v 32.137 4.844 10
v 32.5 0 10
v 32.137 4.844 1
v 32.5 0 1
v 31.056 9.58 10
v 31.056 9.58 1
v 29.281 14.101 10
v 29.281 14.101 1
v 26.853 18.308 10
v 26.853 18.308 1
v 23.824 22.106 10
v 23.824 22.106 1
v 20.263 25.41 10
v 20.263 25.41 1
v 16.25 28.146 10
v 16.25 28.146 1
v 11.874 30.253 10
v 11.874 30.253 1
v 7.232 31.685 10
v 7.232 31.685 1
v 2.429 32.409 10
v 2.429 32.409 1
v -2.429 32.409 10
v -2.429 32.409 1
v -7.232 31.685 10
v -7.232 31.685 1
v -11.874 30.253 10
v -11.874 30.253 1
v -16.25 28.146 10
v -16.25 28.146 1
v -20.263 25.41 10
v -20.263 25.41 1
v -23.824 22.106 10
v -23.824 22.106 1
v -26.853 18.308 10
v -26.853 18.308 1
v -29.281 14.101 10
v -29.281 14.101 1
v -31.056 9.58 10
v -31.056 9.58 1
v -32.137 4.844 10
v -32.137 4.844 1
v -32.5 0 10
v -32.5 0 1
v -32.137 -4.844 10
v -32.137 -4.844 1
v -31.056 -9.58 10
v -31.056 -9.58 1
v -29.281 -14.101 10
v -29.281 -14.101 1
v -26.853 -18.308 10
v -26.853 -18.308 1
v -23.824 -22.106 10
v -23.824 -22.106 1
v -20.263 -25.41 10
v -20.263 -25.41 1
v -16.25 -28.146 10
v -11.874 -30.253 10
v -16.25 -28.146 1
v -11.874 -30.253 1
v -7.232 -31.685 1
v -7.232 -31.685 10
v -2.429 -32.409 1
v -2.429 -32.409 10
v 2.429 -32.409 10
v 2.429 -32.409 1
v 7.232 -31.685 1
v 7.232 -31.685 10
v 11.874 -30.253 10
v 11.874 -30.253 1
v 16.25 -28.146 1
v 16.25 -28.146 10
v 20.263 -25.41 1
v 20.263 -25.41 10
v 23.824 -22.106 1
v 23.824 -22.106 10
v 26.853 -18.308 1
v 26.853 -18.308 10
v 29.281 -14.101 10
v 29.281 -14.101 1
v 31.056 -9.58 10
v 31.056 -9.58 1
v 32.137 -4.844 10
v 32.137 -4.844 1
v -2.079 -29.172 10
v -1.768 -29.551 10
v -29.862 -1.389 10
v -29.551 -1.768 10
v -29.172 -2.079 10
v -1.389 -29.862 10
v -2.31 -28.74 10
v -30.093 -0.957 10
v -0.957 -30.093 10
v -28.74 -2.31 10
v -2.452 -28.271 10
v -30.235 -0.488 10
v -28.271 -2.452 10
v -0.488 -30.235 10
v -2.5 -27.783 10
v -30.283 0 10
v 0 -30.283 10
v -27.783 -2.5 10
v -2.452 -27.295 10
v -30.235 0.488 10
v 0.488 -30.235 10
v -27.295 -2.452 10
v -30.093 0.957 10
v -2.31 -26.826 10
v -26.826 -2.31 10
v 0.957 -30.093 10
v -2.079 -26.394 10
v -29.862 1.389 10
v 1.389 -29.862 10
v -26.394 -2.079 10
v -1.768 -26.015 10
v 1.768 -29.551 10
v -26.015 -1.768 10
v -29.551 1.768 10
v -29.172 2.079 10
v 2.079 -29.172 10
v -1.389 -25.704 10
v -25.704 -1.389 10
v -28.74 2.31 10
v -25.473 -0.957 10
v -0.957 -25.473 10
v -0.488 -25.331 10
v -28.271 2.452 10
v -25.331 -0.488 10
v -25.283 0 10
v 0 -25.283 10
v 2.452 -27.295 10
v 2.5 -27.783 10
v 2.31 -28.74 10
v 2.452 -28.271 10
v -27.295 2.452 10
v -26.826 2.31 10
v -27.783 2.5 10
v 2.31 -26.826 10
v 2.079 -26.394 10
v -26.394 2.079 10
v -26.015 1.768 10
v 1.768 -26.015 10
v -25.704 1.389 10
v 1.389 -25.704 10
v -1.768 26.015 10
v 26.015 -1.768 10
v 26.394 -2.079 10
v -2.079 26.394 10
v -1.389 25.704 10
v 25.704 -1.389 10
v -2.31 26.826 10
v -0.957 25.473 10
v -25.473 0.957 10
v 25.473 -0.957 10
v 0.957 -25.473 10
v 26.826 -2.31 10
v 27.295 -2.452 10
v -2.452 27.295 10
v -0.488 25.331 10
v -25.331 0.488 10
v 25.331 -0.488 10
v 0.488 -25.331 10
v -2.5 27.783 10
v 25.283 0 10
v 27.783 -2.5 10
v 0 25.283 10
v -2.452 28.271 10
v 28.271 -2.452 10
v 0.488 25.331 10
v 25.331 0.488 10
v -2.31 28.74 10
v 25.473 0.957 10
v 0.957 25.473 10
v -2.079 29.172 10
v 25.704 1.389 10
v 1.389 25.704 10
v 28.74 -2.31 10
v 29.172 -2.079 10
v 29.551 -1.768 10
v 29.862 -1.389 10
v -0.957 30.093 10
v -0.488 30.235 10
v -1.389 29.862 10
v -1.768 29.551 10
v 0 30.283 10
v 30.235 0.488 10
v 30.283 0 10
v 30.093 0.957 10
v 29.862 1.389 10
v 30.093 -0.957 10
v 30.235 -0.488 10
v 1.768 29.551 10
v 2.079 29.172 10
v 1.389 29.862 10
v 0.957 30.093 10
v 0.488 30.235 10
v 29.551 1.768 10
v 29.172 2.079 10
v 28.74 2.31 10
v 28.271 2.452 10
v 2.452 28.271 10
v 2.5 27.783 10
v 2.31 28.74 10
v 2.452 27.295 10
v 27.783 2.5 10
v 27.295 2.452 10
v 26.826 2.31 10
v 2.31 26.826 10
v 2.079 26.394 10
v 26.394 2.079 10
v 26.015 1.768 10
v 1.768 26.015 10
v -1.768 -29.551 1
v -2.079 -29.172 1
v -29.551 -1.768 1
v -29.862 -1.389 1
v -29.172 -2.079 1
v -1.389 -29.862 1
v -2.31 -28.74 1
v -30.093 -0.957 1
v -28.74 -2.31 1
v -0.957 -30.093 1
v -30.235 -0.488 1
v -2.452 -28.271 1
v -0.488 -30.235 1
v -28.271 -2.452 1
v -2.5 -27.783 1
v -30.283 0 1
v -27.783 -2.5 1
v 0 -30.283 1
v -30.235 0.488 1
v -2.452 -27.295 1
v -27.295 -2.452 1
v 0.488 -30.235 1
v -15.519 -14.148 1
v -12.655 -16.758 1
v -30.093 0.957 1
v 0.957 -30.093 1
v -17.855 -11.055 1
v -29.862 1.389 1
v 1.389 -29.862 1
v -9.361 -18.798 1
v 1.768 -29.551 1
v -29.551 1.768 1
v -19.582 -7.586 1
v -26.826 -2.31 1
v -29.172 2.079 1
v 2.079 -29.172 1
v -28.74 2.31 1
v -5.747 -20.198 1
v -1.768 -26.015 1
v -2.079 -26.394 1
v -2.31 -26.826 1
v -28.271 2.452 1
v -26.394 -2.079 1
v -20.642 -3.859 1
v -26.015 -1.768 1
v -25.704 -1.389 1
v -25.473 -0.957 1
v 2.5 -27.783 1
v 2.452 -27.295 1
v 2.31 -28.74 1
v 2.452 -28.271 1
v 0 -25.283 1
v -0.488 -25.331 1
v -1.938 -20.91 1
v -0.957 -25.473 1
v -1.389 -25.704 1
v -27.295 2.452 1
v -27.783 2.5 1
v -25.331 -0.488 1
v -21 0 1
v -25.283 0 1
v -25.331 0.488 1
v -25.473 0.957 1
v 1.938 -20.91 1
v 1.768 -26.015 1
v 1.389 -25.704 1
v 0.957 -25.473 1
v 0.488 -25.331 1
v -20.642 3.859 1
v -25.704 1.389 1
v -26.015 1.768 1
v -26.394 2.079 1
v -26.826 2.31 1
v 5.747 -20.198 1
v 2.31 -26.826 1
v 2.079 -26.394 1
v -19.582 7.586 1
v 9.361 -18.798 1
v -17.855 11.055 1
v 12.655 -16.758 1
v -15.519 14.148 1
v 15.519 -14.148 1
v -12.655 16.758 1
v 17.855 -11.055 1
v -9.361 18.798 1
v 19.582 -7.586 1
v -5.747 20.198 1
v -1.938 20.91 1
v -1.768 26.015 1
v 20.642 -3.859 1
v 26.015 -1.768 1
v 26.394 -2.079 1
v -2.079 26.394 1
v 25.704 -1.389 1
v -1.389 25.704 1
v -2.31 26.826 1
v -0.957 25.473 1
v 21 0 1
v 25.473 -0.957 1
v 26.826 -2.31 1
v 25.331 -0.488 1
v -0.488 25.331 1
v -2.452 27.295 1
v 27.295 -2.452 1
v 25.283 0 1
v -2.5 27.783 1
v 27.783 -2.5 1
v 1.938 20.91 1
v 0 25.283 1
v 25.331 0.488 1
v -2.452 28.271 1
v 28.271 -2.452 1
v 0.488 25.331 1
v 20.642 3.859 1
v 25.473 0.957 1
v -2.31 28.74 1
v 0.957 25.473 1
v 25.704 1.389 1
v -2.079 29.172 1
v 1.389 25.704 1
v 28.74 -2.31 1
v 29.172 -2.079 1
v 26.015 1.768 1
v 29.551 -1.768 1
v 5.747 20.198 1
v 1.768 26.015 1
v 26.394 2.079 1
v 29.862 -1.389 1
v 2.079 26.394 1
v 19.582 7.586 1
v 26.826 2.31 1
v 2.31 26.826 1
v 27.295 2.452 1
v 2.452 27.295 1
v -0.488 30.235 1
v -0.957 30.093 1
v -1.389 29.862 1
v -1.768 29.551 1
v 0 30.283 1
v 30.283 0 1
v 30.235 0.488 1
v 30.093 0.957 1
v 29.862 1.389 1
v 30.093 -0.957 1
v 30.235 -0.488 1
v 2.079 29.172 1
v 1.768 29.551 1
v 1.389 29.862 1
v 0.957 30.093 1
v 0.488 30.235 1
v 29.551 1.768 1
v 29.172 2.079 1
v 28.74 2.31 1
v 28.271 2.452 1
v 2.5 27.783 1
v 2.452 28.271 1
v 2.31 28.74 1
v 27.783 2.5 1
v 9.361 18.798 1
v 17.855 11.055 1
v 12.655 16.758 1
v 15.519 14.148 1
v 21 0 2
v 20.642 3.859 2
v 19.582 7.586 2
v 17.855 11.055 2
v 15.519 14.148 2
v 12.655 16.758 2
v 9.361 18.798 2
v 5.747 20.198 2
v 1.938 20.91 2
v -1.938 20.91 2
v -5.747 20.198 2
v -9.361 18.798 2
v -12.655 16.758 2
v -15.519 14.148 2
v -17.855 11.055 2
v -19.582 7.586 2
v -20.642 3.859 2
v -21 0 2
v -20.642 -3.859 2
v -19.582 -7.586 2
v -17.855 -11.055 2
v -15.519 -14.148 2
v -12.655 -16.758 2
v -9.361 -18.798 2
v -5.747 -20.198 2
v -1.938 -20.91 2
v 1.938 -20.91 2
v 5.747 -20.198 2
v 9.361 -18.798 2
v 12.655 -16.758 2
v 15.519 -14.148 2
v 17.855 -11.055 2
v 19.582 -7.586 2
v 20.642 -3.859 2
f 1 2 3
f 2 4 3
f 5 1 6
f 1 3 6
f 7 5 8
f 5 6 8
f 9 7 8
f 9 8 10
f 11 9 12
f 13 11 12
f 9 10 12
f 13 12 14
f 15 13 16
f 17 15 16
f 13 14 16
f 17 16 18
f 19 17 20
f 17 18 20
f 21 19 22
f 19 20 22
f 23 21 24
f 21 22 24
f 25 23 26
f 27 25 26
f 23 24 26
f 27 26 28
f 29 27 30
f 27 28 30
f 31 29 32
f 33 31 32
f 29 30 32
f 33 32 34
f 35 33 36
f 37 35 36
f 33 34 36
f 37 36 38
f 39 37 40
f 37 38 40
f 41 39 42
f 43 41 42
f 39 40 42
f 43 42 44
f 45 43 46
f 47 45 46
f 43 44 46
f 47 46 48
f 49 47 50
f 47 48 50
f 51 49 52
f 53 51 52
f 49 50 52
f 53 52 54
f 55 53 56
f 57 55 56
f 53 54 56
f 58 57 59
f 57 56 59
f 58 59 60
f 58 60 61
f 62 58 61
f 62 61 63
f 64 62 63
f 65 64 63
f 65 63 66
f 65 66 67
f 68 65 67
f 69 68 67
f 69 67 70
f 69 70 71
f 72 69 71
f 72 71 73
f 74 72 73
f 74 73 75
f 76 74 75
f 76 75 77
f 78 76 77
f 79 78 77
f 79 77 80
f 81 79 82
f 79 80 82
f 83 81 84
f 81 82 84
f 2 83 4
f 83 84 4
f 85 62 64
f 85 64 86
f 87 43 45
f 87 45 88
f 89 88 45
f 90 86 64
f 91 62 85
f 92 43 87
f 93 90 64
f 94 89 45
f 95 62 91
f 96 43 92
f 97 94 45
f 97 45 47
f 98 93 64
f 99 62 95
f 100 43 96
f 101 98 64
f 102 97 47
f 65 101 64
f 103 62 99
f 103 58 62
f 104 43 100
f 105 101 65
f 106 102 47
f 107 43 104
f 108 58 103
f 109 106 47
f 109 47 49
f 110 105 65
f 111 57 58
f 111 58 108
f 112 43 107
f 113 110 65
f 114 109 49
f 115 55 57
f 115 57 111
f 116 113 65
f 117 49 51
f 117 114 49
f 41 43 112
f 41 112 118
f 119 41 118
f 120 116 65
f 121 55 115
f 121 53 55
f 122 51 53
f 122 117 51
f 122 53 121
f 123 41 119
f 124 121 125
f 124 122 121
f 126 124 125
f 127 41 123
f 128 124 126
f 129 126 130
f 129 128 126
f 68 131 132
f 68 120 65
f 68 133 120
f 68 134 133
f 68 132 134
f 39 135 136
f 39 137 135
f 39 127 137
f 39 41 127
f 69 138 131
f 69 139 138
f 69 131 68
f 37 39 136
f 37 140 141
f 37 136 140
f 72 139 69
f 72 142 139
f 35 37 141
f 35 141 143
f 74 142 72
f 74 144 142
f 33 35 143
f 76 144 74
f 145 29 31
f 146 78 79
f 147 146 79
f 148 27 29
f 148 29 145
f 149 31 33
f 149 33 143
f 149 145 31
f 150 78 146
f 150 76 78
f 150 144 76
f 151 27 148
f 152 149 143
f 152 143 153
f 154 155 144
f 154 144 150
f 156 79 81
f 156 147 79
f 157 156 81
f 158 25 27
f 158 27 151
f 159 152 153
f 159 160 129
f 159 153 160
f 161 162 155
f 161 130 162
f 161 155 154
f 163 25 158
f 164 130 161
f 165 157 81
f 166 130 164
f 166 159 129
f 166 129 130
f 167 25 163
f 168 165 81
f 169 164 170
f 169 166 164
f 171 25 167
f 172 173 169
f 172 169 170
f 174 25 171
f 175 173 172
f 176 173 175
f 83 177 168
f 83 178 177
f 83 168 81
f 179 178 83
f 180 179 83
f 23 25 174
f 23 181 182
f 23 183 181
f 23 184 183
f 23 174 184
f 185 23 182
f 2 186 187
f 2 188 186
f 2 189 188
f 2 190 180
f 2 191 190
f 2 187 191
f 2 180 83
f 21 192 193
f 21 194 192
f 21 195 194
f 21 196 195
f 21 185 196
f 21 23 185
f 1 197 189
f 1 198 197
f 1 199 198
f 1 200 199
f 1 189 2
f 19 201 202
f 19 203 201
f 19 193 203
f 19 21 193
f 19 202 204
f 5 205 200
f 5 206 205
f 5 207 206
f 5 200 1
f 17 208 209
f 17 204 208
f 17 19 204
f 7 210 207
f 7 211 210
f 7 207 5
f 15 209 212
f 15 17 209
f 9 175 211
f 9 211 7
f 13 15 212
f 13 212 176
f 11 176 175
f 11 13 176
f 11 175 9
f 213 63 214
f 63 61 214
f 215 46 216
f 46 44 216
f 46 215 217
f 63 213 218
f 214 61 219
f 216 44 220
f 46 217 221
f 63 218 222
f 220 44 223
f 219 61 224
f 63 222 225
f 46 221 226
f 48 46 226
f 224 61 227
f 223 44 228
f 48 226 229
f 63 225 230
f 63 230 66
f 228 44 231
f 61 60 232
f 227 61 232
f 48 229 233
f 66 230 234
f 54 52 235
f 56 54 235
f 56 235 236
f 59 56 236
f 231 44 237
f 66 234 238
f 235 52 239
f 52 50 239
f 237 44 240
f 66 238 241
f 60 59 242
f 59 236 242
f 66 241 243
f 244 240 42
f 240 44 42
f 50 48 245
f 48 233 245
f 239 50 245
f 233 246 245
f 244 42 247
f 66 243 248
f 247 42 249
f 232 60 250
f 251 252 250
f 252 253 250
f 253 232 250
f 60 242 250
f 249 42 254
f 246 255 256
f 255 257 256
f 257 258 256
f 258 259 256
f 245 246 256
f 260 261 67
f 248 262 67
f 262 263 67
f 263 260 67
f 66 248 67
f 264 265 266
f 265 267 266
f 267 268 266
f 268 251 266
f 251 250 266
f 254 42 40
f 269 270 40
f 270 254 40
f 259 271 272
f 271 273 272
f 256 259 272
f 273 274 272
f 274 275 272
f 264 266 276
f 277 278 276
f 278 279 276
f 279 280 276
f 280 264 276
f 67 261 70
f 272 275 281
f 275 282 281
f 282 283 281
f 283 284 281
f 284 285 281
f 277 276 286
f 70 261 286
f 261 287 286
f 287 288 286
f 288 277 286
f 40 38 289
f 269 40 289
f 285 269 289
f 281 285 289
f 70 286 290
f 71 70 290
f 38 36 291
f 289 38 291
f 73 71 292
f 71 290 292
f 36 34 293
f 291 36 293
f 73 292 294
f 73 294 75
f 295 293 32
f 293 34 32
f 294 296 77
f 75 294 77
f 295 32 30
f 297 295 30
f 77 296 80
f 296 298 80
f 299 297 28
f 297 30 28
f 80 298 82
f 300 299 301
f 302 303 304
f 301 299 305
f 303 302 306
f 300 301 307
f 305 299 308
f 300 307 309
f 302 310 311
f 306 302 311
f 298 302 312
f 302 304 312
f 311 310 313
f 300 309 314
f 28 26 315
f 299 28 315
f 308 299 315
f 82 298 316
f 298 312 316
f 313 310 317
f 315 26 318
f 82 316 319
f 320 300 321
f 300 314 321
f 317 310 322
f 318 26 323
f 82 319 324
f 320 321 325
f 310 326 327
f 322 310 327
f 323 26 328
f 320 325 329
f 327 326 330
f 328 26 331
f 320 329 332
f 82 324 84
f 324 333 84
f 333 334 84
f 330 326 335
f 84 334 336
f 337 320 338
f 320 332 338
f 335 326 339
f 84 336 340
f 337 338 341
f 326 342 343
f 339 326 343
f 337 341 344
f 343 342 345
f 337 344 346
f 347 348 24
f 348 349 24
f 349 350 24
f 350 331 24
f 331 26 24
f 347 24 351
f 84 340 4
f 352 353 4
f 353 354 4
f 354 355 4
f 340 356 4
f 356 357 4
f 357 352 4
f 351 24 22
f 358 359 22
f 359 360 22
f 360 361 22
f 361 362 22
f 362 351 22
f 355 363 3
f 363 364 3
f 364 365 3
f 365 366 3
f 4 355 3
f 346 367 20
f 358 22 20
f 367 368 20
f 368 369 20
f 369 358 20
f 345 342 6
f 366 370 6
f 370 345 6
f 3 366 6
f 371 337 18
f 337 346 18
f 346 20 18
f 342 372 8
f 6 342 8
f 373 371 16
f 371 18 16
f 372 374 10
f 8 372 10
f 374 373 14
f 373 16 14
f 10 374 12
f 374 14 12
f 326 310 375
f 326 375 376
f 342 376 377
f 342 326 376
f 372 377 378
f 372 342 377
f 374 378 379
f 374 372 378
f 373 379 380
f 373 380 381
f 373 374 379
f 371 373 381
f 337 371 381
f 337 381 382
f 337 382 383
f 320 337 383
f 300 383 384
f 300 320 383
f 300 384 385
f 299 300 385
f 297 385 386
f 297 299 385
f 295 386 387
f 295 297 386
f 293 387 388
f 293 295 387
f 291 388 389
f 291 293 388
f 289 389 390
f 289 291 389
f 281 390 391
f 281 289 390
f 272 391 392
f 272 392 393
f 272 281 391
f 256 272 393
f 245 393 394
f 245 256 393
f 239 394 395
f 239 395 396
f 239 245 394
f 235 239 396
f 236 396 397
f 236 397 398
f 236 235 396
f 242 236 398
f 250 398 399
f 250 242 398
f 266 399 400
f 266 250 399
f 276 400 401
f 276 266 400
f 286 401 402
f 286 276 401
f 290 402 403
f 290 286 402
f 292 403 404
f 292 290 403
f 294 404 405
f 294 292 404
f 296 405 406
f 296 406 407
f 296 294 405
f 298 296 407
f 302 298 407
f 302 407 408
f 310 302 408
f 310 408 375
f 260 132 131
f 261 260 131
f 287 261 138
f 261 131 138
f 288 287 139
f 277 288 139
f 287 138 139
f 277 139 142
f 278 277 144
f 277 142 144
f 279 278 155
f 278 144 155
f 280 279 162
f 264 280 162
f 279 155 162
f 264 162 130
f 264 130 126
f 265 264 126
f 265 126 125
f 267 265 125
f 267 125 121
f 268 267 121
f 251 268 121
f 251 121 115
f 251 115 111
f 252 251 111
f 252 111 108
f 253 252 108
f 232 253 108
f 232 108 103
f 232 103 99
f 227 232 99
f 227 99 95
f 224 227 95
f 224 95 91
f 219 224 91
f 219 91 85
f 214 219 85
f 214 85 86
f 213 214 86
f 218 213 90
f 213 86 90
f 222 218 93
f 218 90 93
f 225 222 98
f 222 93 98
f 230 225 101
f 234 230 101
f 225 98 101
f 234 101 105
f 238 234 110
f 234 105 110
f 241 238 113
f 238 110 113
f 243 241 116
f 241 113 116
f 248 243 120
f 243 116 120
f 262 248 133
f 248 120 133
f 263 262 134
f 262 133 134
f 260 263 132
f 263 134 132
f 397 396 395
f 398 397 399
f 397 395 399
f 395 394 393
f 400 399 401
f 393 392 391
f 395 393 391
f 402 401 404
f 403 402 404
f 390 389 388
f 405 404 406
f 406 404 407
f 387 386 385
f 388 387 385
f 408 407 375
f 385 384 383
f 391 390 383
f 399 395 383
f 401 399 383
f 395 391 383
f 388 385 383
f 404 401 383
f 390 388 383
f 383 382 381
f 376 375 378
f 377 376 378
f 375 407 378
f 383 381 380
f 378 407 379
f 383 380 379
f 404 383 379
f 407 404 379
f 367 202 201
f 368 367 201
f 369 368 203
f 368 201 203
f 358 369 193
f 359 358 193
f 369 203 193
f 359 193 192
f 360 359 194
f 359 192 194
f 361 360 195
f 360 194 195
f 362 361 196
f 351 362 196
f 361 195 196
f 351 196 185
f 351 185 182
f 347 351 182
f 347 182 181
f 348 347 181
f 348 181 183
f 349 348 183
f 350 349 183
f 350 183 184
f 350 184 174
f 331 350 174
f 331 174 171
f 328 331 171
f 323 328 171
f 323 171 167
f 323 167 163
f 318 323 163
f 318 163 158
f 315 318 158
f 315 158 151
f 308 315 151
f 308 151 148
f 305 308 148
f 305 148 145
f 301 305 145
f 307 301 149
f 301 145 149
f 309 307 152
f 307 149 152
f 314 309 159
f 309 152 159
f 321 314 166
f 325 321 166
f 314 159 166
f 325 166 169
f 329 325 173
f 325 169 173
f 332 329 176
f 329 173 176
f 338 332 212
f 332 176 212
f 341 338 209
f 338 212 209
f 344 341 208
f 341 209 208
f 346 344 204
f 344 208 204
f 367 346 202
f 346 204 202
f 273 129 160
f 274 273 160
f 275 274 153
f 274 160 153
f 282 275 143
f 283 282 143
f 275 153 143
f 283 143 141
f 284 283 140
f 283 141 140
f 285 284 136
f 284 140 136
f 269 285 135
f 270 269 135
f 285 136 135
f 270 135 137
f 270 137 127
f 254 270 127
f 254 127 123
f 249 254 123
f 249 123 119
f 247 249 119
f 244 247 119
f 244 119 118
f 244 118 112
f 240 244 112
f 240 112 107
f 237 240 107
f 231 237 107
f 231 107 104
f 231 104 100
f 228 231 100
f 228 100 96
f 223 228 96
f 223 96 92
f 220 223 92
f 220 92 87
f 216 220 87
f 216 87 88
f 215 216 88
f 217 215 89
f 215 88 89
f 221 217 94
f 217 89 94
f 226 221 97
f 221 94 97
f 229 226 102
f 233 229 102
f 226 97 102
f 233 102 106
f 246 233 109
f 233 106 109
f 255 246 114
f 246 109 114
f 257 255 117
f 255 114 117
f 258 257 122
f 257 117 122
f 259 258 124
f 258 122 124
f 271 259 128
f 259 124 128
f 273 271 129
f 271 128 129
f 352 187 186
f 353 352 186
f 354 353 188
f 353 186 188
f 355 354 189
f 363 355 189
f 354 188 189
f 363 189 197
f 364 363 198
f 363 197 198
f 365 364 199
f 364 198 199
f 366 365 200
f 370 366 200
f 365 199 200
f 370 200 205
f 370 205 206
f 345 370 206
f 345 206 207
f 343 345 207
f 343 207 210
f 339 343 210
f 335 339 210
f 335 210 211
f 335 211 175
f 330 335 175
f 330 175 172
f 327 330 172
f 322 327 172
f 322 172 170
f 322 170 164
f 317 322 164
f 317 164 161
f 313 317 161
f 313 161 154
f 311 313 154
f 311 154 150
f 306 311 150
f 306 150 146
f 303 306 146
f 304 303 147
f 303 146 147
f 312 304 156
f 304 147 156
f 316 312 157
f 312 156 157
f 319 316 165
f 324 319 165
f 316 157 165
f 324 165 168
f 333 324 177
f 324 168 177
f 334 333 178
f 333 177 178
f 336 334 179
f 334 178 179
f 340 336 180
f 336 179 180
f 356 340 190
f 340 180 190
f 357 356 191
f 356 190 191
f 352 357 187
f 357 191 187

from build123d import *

# Parameters (mm, degrees)
BOSS_EXTRUDE1_START = 1
SKETCH1_R           = 32.5
SKETCH1_R_2         = 21
BOSS_EXTRUDE1_DEPTH = 1
SKETCH2_R           = 32.5
BOSS_EXTRUDE2_DEPTH = 8
SKETCH3_R           = 2.5
CUT_EXTRUDE1_DEPTH  = 47.834816109


with BuildPart() as part:
    # Sketch1 → Boss-Extrude1 (new body)
    with BuildSketch(Plane.XY.offset(BOSS_EXTRUDE1_START)):
        Circle(SKETCH1_R)
        Circle(SKETCH1_R_2, mode=Mode.SUBTRACT)
    extrude(amount=BOSS_EXTRUDE1_DEPTH)

    # Sketch2 → Boss-Extrude2 (add)
    with BuildSketch(Plane.XY.offset(2)):
        Circle(SKETCH2_R)
    extrude(amount=BOSS_EXTRUDE2_DEPTH)

    # Sketch3 → Cut-Extrude1 (cut, through all)
    with BuildSketch(Plane.XY.offset(10)):
        with Locations((0, 27.783091373)):
            Circle(SKETCH3_R)
        with Locations((27.783091373, 0)):
            Circle(SKETCH3_R)
        with Locations((0, -27.783091373)):
            Circle(SKETCH3_R)
        with Locations((-27.783091373, 0)):
            Circle(SKETCH3_R)
    extrude(amount=-CUT_EXTRUDE1_DEPTH, mode=Mode.SUBTRACT)


solid = part.part
